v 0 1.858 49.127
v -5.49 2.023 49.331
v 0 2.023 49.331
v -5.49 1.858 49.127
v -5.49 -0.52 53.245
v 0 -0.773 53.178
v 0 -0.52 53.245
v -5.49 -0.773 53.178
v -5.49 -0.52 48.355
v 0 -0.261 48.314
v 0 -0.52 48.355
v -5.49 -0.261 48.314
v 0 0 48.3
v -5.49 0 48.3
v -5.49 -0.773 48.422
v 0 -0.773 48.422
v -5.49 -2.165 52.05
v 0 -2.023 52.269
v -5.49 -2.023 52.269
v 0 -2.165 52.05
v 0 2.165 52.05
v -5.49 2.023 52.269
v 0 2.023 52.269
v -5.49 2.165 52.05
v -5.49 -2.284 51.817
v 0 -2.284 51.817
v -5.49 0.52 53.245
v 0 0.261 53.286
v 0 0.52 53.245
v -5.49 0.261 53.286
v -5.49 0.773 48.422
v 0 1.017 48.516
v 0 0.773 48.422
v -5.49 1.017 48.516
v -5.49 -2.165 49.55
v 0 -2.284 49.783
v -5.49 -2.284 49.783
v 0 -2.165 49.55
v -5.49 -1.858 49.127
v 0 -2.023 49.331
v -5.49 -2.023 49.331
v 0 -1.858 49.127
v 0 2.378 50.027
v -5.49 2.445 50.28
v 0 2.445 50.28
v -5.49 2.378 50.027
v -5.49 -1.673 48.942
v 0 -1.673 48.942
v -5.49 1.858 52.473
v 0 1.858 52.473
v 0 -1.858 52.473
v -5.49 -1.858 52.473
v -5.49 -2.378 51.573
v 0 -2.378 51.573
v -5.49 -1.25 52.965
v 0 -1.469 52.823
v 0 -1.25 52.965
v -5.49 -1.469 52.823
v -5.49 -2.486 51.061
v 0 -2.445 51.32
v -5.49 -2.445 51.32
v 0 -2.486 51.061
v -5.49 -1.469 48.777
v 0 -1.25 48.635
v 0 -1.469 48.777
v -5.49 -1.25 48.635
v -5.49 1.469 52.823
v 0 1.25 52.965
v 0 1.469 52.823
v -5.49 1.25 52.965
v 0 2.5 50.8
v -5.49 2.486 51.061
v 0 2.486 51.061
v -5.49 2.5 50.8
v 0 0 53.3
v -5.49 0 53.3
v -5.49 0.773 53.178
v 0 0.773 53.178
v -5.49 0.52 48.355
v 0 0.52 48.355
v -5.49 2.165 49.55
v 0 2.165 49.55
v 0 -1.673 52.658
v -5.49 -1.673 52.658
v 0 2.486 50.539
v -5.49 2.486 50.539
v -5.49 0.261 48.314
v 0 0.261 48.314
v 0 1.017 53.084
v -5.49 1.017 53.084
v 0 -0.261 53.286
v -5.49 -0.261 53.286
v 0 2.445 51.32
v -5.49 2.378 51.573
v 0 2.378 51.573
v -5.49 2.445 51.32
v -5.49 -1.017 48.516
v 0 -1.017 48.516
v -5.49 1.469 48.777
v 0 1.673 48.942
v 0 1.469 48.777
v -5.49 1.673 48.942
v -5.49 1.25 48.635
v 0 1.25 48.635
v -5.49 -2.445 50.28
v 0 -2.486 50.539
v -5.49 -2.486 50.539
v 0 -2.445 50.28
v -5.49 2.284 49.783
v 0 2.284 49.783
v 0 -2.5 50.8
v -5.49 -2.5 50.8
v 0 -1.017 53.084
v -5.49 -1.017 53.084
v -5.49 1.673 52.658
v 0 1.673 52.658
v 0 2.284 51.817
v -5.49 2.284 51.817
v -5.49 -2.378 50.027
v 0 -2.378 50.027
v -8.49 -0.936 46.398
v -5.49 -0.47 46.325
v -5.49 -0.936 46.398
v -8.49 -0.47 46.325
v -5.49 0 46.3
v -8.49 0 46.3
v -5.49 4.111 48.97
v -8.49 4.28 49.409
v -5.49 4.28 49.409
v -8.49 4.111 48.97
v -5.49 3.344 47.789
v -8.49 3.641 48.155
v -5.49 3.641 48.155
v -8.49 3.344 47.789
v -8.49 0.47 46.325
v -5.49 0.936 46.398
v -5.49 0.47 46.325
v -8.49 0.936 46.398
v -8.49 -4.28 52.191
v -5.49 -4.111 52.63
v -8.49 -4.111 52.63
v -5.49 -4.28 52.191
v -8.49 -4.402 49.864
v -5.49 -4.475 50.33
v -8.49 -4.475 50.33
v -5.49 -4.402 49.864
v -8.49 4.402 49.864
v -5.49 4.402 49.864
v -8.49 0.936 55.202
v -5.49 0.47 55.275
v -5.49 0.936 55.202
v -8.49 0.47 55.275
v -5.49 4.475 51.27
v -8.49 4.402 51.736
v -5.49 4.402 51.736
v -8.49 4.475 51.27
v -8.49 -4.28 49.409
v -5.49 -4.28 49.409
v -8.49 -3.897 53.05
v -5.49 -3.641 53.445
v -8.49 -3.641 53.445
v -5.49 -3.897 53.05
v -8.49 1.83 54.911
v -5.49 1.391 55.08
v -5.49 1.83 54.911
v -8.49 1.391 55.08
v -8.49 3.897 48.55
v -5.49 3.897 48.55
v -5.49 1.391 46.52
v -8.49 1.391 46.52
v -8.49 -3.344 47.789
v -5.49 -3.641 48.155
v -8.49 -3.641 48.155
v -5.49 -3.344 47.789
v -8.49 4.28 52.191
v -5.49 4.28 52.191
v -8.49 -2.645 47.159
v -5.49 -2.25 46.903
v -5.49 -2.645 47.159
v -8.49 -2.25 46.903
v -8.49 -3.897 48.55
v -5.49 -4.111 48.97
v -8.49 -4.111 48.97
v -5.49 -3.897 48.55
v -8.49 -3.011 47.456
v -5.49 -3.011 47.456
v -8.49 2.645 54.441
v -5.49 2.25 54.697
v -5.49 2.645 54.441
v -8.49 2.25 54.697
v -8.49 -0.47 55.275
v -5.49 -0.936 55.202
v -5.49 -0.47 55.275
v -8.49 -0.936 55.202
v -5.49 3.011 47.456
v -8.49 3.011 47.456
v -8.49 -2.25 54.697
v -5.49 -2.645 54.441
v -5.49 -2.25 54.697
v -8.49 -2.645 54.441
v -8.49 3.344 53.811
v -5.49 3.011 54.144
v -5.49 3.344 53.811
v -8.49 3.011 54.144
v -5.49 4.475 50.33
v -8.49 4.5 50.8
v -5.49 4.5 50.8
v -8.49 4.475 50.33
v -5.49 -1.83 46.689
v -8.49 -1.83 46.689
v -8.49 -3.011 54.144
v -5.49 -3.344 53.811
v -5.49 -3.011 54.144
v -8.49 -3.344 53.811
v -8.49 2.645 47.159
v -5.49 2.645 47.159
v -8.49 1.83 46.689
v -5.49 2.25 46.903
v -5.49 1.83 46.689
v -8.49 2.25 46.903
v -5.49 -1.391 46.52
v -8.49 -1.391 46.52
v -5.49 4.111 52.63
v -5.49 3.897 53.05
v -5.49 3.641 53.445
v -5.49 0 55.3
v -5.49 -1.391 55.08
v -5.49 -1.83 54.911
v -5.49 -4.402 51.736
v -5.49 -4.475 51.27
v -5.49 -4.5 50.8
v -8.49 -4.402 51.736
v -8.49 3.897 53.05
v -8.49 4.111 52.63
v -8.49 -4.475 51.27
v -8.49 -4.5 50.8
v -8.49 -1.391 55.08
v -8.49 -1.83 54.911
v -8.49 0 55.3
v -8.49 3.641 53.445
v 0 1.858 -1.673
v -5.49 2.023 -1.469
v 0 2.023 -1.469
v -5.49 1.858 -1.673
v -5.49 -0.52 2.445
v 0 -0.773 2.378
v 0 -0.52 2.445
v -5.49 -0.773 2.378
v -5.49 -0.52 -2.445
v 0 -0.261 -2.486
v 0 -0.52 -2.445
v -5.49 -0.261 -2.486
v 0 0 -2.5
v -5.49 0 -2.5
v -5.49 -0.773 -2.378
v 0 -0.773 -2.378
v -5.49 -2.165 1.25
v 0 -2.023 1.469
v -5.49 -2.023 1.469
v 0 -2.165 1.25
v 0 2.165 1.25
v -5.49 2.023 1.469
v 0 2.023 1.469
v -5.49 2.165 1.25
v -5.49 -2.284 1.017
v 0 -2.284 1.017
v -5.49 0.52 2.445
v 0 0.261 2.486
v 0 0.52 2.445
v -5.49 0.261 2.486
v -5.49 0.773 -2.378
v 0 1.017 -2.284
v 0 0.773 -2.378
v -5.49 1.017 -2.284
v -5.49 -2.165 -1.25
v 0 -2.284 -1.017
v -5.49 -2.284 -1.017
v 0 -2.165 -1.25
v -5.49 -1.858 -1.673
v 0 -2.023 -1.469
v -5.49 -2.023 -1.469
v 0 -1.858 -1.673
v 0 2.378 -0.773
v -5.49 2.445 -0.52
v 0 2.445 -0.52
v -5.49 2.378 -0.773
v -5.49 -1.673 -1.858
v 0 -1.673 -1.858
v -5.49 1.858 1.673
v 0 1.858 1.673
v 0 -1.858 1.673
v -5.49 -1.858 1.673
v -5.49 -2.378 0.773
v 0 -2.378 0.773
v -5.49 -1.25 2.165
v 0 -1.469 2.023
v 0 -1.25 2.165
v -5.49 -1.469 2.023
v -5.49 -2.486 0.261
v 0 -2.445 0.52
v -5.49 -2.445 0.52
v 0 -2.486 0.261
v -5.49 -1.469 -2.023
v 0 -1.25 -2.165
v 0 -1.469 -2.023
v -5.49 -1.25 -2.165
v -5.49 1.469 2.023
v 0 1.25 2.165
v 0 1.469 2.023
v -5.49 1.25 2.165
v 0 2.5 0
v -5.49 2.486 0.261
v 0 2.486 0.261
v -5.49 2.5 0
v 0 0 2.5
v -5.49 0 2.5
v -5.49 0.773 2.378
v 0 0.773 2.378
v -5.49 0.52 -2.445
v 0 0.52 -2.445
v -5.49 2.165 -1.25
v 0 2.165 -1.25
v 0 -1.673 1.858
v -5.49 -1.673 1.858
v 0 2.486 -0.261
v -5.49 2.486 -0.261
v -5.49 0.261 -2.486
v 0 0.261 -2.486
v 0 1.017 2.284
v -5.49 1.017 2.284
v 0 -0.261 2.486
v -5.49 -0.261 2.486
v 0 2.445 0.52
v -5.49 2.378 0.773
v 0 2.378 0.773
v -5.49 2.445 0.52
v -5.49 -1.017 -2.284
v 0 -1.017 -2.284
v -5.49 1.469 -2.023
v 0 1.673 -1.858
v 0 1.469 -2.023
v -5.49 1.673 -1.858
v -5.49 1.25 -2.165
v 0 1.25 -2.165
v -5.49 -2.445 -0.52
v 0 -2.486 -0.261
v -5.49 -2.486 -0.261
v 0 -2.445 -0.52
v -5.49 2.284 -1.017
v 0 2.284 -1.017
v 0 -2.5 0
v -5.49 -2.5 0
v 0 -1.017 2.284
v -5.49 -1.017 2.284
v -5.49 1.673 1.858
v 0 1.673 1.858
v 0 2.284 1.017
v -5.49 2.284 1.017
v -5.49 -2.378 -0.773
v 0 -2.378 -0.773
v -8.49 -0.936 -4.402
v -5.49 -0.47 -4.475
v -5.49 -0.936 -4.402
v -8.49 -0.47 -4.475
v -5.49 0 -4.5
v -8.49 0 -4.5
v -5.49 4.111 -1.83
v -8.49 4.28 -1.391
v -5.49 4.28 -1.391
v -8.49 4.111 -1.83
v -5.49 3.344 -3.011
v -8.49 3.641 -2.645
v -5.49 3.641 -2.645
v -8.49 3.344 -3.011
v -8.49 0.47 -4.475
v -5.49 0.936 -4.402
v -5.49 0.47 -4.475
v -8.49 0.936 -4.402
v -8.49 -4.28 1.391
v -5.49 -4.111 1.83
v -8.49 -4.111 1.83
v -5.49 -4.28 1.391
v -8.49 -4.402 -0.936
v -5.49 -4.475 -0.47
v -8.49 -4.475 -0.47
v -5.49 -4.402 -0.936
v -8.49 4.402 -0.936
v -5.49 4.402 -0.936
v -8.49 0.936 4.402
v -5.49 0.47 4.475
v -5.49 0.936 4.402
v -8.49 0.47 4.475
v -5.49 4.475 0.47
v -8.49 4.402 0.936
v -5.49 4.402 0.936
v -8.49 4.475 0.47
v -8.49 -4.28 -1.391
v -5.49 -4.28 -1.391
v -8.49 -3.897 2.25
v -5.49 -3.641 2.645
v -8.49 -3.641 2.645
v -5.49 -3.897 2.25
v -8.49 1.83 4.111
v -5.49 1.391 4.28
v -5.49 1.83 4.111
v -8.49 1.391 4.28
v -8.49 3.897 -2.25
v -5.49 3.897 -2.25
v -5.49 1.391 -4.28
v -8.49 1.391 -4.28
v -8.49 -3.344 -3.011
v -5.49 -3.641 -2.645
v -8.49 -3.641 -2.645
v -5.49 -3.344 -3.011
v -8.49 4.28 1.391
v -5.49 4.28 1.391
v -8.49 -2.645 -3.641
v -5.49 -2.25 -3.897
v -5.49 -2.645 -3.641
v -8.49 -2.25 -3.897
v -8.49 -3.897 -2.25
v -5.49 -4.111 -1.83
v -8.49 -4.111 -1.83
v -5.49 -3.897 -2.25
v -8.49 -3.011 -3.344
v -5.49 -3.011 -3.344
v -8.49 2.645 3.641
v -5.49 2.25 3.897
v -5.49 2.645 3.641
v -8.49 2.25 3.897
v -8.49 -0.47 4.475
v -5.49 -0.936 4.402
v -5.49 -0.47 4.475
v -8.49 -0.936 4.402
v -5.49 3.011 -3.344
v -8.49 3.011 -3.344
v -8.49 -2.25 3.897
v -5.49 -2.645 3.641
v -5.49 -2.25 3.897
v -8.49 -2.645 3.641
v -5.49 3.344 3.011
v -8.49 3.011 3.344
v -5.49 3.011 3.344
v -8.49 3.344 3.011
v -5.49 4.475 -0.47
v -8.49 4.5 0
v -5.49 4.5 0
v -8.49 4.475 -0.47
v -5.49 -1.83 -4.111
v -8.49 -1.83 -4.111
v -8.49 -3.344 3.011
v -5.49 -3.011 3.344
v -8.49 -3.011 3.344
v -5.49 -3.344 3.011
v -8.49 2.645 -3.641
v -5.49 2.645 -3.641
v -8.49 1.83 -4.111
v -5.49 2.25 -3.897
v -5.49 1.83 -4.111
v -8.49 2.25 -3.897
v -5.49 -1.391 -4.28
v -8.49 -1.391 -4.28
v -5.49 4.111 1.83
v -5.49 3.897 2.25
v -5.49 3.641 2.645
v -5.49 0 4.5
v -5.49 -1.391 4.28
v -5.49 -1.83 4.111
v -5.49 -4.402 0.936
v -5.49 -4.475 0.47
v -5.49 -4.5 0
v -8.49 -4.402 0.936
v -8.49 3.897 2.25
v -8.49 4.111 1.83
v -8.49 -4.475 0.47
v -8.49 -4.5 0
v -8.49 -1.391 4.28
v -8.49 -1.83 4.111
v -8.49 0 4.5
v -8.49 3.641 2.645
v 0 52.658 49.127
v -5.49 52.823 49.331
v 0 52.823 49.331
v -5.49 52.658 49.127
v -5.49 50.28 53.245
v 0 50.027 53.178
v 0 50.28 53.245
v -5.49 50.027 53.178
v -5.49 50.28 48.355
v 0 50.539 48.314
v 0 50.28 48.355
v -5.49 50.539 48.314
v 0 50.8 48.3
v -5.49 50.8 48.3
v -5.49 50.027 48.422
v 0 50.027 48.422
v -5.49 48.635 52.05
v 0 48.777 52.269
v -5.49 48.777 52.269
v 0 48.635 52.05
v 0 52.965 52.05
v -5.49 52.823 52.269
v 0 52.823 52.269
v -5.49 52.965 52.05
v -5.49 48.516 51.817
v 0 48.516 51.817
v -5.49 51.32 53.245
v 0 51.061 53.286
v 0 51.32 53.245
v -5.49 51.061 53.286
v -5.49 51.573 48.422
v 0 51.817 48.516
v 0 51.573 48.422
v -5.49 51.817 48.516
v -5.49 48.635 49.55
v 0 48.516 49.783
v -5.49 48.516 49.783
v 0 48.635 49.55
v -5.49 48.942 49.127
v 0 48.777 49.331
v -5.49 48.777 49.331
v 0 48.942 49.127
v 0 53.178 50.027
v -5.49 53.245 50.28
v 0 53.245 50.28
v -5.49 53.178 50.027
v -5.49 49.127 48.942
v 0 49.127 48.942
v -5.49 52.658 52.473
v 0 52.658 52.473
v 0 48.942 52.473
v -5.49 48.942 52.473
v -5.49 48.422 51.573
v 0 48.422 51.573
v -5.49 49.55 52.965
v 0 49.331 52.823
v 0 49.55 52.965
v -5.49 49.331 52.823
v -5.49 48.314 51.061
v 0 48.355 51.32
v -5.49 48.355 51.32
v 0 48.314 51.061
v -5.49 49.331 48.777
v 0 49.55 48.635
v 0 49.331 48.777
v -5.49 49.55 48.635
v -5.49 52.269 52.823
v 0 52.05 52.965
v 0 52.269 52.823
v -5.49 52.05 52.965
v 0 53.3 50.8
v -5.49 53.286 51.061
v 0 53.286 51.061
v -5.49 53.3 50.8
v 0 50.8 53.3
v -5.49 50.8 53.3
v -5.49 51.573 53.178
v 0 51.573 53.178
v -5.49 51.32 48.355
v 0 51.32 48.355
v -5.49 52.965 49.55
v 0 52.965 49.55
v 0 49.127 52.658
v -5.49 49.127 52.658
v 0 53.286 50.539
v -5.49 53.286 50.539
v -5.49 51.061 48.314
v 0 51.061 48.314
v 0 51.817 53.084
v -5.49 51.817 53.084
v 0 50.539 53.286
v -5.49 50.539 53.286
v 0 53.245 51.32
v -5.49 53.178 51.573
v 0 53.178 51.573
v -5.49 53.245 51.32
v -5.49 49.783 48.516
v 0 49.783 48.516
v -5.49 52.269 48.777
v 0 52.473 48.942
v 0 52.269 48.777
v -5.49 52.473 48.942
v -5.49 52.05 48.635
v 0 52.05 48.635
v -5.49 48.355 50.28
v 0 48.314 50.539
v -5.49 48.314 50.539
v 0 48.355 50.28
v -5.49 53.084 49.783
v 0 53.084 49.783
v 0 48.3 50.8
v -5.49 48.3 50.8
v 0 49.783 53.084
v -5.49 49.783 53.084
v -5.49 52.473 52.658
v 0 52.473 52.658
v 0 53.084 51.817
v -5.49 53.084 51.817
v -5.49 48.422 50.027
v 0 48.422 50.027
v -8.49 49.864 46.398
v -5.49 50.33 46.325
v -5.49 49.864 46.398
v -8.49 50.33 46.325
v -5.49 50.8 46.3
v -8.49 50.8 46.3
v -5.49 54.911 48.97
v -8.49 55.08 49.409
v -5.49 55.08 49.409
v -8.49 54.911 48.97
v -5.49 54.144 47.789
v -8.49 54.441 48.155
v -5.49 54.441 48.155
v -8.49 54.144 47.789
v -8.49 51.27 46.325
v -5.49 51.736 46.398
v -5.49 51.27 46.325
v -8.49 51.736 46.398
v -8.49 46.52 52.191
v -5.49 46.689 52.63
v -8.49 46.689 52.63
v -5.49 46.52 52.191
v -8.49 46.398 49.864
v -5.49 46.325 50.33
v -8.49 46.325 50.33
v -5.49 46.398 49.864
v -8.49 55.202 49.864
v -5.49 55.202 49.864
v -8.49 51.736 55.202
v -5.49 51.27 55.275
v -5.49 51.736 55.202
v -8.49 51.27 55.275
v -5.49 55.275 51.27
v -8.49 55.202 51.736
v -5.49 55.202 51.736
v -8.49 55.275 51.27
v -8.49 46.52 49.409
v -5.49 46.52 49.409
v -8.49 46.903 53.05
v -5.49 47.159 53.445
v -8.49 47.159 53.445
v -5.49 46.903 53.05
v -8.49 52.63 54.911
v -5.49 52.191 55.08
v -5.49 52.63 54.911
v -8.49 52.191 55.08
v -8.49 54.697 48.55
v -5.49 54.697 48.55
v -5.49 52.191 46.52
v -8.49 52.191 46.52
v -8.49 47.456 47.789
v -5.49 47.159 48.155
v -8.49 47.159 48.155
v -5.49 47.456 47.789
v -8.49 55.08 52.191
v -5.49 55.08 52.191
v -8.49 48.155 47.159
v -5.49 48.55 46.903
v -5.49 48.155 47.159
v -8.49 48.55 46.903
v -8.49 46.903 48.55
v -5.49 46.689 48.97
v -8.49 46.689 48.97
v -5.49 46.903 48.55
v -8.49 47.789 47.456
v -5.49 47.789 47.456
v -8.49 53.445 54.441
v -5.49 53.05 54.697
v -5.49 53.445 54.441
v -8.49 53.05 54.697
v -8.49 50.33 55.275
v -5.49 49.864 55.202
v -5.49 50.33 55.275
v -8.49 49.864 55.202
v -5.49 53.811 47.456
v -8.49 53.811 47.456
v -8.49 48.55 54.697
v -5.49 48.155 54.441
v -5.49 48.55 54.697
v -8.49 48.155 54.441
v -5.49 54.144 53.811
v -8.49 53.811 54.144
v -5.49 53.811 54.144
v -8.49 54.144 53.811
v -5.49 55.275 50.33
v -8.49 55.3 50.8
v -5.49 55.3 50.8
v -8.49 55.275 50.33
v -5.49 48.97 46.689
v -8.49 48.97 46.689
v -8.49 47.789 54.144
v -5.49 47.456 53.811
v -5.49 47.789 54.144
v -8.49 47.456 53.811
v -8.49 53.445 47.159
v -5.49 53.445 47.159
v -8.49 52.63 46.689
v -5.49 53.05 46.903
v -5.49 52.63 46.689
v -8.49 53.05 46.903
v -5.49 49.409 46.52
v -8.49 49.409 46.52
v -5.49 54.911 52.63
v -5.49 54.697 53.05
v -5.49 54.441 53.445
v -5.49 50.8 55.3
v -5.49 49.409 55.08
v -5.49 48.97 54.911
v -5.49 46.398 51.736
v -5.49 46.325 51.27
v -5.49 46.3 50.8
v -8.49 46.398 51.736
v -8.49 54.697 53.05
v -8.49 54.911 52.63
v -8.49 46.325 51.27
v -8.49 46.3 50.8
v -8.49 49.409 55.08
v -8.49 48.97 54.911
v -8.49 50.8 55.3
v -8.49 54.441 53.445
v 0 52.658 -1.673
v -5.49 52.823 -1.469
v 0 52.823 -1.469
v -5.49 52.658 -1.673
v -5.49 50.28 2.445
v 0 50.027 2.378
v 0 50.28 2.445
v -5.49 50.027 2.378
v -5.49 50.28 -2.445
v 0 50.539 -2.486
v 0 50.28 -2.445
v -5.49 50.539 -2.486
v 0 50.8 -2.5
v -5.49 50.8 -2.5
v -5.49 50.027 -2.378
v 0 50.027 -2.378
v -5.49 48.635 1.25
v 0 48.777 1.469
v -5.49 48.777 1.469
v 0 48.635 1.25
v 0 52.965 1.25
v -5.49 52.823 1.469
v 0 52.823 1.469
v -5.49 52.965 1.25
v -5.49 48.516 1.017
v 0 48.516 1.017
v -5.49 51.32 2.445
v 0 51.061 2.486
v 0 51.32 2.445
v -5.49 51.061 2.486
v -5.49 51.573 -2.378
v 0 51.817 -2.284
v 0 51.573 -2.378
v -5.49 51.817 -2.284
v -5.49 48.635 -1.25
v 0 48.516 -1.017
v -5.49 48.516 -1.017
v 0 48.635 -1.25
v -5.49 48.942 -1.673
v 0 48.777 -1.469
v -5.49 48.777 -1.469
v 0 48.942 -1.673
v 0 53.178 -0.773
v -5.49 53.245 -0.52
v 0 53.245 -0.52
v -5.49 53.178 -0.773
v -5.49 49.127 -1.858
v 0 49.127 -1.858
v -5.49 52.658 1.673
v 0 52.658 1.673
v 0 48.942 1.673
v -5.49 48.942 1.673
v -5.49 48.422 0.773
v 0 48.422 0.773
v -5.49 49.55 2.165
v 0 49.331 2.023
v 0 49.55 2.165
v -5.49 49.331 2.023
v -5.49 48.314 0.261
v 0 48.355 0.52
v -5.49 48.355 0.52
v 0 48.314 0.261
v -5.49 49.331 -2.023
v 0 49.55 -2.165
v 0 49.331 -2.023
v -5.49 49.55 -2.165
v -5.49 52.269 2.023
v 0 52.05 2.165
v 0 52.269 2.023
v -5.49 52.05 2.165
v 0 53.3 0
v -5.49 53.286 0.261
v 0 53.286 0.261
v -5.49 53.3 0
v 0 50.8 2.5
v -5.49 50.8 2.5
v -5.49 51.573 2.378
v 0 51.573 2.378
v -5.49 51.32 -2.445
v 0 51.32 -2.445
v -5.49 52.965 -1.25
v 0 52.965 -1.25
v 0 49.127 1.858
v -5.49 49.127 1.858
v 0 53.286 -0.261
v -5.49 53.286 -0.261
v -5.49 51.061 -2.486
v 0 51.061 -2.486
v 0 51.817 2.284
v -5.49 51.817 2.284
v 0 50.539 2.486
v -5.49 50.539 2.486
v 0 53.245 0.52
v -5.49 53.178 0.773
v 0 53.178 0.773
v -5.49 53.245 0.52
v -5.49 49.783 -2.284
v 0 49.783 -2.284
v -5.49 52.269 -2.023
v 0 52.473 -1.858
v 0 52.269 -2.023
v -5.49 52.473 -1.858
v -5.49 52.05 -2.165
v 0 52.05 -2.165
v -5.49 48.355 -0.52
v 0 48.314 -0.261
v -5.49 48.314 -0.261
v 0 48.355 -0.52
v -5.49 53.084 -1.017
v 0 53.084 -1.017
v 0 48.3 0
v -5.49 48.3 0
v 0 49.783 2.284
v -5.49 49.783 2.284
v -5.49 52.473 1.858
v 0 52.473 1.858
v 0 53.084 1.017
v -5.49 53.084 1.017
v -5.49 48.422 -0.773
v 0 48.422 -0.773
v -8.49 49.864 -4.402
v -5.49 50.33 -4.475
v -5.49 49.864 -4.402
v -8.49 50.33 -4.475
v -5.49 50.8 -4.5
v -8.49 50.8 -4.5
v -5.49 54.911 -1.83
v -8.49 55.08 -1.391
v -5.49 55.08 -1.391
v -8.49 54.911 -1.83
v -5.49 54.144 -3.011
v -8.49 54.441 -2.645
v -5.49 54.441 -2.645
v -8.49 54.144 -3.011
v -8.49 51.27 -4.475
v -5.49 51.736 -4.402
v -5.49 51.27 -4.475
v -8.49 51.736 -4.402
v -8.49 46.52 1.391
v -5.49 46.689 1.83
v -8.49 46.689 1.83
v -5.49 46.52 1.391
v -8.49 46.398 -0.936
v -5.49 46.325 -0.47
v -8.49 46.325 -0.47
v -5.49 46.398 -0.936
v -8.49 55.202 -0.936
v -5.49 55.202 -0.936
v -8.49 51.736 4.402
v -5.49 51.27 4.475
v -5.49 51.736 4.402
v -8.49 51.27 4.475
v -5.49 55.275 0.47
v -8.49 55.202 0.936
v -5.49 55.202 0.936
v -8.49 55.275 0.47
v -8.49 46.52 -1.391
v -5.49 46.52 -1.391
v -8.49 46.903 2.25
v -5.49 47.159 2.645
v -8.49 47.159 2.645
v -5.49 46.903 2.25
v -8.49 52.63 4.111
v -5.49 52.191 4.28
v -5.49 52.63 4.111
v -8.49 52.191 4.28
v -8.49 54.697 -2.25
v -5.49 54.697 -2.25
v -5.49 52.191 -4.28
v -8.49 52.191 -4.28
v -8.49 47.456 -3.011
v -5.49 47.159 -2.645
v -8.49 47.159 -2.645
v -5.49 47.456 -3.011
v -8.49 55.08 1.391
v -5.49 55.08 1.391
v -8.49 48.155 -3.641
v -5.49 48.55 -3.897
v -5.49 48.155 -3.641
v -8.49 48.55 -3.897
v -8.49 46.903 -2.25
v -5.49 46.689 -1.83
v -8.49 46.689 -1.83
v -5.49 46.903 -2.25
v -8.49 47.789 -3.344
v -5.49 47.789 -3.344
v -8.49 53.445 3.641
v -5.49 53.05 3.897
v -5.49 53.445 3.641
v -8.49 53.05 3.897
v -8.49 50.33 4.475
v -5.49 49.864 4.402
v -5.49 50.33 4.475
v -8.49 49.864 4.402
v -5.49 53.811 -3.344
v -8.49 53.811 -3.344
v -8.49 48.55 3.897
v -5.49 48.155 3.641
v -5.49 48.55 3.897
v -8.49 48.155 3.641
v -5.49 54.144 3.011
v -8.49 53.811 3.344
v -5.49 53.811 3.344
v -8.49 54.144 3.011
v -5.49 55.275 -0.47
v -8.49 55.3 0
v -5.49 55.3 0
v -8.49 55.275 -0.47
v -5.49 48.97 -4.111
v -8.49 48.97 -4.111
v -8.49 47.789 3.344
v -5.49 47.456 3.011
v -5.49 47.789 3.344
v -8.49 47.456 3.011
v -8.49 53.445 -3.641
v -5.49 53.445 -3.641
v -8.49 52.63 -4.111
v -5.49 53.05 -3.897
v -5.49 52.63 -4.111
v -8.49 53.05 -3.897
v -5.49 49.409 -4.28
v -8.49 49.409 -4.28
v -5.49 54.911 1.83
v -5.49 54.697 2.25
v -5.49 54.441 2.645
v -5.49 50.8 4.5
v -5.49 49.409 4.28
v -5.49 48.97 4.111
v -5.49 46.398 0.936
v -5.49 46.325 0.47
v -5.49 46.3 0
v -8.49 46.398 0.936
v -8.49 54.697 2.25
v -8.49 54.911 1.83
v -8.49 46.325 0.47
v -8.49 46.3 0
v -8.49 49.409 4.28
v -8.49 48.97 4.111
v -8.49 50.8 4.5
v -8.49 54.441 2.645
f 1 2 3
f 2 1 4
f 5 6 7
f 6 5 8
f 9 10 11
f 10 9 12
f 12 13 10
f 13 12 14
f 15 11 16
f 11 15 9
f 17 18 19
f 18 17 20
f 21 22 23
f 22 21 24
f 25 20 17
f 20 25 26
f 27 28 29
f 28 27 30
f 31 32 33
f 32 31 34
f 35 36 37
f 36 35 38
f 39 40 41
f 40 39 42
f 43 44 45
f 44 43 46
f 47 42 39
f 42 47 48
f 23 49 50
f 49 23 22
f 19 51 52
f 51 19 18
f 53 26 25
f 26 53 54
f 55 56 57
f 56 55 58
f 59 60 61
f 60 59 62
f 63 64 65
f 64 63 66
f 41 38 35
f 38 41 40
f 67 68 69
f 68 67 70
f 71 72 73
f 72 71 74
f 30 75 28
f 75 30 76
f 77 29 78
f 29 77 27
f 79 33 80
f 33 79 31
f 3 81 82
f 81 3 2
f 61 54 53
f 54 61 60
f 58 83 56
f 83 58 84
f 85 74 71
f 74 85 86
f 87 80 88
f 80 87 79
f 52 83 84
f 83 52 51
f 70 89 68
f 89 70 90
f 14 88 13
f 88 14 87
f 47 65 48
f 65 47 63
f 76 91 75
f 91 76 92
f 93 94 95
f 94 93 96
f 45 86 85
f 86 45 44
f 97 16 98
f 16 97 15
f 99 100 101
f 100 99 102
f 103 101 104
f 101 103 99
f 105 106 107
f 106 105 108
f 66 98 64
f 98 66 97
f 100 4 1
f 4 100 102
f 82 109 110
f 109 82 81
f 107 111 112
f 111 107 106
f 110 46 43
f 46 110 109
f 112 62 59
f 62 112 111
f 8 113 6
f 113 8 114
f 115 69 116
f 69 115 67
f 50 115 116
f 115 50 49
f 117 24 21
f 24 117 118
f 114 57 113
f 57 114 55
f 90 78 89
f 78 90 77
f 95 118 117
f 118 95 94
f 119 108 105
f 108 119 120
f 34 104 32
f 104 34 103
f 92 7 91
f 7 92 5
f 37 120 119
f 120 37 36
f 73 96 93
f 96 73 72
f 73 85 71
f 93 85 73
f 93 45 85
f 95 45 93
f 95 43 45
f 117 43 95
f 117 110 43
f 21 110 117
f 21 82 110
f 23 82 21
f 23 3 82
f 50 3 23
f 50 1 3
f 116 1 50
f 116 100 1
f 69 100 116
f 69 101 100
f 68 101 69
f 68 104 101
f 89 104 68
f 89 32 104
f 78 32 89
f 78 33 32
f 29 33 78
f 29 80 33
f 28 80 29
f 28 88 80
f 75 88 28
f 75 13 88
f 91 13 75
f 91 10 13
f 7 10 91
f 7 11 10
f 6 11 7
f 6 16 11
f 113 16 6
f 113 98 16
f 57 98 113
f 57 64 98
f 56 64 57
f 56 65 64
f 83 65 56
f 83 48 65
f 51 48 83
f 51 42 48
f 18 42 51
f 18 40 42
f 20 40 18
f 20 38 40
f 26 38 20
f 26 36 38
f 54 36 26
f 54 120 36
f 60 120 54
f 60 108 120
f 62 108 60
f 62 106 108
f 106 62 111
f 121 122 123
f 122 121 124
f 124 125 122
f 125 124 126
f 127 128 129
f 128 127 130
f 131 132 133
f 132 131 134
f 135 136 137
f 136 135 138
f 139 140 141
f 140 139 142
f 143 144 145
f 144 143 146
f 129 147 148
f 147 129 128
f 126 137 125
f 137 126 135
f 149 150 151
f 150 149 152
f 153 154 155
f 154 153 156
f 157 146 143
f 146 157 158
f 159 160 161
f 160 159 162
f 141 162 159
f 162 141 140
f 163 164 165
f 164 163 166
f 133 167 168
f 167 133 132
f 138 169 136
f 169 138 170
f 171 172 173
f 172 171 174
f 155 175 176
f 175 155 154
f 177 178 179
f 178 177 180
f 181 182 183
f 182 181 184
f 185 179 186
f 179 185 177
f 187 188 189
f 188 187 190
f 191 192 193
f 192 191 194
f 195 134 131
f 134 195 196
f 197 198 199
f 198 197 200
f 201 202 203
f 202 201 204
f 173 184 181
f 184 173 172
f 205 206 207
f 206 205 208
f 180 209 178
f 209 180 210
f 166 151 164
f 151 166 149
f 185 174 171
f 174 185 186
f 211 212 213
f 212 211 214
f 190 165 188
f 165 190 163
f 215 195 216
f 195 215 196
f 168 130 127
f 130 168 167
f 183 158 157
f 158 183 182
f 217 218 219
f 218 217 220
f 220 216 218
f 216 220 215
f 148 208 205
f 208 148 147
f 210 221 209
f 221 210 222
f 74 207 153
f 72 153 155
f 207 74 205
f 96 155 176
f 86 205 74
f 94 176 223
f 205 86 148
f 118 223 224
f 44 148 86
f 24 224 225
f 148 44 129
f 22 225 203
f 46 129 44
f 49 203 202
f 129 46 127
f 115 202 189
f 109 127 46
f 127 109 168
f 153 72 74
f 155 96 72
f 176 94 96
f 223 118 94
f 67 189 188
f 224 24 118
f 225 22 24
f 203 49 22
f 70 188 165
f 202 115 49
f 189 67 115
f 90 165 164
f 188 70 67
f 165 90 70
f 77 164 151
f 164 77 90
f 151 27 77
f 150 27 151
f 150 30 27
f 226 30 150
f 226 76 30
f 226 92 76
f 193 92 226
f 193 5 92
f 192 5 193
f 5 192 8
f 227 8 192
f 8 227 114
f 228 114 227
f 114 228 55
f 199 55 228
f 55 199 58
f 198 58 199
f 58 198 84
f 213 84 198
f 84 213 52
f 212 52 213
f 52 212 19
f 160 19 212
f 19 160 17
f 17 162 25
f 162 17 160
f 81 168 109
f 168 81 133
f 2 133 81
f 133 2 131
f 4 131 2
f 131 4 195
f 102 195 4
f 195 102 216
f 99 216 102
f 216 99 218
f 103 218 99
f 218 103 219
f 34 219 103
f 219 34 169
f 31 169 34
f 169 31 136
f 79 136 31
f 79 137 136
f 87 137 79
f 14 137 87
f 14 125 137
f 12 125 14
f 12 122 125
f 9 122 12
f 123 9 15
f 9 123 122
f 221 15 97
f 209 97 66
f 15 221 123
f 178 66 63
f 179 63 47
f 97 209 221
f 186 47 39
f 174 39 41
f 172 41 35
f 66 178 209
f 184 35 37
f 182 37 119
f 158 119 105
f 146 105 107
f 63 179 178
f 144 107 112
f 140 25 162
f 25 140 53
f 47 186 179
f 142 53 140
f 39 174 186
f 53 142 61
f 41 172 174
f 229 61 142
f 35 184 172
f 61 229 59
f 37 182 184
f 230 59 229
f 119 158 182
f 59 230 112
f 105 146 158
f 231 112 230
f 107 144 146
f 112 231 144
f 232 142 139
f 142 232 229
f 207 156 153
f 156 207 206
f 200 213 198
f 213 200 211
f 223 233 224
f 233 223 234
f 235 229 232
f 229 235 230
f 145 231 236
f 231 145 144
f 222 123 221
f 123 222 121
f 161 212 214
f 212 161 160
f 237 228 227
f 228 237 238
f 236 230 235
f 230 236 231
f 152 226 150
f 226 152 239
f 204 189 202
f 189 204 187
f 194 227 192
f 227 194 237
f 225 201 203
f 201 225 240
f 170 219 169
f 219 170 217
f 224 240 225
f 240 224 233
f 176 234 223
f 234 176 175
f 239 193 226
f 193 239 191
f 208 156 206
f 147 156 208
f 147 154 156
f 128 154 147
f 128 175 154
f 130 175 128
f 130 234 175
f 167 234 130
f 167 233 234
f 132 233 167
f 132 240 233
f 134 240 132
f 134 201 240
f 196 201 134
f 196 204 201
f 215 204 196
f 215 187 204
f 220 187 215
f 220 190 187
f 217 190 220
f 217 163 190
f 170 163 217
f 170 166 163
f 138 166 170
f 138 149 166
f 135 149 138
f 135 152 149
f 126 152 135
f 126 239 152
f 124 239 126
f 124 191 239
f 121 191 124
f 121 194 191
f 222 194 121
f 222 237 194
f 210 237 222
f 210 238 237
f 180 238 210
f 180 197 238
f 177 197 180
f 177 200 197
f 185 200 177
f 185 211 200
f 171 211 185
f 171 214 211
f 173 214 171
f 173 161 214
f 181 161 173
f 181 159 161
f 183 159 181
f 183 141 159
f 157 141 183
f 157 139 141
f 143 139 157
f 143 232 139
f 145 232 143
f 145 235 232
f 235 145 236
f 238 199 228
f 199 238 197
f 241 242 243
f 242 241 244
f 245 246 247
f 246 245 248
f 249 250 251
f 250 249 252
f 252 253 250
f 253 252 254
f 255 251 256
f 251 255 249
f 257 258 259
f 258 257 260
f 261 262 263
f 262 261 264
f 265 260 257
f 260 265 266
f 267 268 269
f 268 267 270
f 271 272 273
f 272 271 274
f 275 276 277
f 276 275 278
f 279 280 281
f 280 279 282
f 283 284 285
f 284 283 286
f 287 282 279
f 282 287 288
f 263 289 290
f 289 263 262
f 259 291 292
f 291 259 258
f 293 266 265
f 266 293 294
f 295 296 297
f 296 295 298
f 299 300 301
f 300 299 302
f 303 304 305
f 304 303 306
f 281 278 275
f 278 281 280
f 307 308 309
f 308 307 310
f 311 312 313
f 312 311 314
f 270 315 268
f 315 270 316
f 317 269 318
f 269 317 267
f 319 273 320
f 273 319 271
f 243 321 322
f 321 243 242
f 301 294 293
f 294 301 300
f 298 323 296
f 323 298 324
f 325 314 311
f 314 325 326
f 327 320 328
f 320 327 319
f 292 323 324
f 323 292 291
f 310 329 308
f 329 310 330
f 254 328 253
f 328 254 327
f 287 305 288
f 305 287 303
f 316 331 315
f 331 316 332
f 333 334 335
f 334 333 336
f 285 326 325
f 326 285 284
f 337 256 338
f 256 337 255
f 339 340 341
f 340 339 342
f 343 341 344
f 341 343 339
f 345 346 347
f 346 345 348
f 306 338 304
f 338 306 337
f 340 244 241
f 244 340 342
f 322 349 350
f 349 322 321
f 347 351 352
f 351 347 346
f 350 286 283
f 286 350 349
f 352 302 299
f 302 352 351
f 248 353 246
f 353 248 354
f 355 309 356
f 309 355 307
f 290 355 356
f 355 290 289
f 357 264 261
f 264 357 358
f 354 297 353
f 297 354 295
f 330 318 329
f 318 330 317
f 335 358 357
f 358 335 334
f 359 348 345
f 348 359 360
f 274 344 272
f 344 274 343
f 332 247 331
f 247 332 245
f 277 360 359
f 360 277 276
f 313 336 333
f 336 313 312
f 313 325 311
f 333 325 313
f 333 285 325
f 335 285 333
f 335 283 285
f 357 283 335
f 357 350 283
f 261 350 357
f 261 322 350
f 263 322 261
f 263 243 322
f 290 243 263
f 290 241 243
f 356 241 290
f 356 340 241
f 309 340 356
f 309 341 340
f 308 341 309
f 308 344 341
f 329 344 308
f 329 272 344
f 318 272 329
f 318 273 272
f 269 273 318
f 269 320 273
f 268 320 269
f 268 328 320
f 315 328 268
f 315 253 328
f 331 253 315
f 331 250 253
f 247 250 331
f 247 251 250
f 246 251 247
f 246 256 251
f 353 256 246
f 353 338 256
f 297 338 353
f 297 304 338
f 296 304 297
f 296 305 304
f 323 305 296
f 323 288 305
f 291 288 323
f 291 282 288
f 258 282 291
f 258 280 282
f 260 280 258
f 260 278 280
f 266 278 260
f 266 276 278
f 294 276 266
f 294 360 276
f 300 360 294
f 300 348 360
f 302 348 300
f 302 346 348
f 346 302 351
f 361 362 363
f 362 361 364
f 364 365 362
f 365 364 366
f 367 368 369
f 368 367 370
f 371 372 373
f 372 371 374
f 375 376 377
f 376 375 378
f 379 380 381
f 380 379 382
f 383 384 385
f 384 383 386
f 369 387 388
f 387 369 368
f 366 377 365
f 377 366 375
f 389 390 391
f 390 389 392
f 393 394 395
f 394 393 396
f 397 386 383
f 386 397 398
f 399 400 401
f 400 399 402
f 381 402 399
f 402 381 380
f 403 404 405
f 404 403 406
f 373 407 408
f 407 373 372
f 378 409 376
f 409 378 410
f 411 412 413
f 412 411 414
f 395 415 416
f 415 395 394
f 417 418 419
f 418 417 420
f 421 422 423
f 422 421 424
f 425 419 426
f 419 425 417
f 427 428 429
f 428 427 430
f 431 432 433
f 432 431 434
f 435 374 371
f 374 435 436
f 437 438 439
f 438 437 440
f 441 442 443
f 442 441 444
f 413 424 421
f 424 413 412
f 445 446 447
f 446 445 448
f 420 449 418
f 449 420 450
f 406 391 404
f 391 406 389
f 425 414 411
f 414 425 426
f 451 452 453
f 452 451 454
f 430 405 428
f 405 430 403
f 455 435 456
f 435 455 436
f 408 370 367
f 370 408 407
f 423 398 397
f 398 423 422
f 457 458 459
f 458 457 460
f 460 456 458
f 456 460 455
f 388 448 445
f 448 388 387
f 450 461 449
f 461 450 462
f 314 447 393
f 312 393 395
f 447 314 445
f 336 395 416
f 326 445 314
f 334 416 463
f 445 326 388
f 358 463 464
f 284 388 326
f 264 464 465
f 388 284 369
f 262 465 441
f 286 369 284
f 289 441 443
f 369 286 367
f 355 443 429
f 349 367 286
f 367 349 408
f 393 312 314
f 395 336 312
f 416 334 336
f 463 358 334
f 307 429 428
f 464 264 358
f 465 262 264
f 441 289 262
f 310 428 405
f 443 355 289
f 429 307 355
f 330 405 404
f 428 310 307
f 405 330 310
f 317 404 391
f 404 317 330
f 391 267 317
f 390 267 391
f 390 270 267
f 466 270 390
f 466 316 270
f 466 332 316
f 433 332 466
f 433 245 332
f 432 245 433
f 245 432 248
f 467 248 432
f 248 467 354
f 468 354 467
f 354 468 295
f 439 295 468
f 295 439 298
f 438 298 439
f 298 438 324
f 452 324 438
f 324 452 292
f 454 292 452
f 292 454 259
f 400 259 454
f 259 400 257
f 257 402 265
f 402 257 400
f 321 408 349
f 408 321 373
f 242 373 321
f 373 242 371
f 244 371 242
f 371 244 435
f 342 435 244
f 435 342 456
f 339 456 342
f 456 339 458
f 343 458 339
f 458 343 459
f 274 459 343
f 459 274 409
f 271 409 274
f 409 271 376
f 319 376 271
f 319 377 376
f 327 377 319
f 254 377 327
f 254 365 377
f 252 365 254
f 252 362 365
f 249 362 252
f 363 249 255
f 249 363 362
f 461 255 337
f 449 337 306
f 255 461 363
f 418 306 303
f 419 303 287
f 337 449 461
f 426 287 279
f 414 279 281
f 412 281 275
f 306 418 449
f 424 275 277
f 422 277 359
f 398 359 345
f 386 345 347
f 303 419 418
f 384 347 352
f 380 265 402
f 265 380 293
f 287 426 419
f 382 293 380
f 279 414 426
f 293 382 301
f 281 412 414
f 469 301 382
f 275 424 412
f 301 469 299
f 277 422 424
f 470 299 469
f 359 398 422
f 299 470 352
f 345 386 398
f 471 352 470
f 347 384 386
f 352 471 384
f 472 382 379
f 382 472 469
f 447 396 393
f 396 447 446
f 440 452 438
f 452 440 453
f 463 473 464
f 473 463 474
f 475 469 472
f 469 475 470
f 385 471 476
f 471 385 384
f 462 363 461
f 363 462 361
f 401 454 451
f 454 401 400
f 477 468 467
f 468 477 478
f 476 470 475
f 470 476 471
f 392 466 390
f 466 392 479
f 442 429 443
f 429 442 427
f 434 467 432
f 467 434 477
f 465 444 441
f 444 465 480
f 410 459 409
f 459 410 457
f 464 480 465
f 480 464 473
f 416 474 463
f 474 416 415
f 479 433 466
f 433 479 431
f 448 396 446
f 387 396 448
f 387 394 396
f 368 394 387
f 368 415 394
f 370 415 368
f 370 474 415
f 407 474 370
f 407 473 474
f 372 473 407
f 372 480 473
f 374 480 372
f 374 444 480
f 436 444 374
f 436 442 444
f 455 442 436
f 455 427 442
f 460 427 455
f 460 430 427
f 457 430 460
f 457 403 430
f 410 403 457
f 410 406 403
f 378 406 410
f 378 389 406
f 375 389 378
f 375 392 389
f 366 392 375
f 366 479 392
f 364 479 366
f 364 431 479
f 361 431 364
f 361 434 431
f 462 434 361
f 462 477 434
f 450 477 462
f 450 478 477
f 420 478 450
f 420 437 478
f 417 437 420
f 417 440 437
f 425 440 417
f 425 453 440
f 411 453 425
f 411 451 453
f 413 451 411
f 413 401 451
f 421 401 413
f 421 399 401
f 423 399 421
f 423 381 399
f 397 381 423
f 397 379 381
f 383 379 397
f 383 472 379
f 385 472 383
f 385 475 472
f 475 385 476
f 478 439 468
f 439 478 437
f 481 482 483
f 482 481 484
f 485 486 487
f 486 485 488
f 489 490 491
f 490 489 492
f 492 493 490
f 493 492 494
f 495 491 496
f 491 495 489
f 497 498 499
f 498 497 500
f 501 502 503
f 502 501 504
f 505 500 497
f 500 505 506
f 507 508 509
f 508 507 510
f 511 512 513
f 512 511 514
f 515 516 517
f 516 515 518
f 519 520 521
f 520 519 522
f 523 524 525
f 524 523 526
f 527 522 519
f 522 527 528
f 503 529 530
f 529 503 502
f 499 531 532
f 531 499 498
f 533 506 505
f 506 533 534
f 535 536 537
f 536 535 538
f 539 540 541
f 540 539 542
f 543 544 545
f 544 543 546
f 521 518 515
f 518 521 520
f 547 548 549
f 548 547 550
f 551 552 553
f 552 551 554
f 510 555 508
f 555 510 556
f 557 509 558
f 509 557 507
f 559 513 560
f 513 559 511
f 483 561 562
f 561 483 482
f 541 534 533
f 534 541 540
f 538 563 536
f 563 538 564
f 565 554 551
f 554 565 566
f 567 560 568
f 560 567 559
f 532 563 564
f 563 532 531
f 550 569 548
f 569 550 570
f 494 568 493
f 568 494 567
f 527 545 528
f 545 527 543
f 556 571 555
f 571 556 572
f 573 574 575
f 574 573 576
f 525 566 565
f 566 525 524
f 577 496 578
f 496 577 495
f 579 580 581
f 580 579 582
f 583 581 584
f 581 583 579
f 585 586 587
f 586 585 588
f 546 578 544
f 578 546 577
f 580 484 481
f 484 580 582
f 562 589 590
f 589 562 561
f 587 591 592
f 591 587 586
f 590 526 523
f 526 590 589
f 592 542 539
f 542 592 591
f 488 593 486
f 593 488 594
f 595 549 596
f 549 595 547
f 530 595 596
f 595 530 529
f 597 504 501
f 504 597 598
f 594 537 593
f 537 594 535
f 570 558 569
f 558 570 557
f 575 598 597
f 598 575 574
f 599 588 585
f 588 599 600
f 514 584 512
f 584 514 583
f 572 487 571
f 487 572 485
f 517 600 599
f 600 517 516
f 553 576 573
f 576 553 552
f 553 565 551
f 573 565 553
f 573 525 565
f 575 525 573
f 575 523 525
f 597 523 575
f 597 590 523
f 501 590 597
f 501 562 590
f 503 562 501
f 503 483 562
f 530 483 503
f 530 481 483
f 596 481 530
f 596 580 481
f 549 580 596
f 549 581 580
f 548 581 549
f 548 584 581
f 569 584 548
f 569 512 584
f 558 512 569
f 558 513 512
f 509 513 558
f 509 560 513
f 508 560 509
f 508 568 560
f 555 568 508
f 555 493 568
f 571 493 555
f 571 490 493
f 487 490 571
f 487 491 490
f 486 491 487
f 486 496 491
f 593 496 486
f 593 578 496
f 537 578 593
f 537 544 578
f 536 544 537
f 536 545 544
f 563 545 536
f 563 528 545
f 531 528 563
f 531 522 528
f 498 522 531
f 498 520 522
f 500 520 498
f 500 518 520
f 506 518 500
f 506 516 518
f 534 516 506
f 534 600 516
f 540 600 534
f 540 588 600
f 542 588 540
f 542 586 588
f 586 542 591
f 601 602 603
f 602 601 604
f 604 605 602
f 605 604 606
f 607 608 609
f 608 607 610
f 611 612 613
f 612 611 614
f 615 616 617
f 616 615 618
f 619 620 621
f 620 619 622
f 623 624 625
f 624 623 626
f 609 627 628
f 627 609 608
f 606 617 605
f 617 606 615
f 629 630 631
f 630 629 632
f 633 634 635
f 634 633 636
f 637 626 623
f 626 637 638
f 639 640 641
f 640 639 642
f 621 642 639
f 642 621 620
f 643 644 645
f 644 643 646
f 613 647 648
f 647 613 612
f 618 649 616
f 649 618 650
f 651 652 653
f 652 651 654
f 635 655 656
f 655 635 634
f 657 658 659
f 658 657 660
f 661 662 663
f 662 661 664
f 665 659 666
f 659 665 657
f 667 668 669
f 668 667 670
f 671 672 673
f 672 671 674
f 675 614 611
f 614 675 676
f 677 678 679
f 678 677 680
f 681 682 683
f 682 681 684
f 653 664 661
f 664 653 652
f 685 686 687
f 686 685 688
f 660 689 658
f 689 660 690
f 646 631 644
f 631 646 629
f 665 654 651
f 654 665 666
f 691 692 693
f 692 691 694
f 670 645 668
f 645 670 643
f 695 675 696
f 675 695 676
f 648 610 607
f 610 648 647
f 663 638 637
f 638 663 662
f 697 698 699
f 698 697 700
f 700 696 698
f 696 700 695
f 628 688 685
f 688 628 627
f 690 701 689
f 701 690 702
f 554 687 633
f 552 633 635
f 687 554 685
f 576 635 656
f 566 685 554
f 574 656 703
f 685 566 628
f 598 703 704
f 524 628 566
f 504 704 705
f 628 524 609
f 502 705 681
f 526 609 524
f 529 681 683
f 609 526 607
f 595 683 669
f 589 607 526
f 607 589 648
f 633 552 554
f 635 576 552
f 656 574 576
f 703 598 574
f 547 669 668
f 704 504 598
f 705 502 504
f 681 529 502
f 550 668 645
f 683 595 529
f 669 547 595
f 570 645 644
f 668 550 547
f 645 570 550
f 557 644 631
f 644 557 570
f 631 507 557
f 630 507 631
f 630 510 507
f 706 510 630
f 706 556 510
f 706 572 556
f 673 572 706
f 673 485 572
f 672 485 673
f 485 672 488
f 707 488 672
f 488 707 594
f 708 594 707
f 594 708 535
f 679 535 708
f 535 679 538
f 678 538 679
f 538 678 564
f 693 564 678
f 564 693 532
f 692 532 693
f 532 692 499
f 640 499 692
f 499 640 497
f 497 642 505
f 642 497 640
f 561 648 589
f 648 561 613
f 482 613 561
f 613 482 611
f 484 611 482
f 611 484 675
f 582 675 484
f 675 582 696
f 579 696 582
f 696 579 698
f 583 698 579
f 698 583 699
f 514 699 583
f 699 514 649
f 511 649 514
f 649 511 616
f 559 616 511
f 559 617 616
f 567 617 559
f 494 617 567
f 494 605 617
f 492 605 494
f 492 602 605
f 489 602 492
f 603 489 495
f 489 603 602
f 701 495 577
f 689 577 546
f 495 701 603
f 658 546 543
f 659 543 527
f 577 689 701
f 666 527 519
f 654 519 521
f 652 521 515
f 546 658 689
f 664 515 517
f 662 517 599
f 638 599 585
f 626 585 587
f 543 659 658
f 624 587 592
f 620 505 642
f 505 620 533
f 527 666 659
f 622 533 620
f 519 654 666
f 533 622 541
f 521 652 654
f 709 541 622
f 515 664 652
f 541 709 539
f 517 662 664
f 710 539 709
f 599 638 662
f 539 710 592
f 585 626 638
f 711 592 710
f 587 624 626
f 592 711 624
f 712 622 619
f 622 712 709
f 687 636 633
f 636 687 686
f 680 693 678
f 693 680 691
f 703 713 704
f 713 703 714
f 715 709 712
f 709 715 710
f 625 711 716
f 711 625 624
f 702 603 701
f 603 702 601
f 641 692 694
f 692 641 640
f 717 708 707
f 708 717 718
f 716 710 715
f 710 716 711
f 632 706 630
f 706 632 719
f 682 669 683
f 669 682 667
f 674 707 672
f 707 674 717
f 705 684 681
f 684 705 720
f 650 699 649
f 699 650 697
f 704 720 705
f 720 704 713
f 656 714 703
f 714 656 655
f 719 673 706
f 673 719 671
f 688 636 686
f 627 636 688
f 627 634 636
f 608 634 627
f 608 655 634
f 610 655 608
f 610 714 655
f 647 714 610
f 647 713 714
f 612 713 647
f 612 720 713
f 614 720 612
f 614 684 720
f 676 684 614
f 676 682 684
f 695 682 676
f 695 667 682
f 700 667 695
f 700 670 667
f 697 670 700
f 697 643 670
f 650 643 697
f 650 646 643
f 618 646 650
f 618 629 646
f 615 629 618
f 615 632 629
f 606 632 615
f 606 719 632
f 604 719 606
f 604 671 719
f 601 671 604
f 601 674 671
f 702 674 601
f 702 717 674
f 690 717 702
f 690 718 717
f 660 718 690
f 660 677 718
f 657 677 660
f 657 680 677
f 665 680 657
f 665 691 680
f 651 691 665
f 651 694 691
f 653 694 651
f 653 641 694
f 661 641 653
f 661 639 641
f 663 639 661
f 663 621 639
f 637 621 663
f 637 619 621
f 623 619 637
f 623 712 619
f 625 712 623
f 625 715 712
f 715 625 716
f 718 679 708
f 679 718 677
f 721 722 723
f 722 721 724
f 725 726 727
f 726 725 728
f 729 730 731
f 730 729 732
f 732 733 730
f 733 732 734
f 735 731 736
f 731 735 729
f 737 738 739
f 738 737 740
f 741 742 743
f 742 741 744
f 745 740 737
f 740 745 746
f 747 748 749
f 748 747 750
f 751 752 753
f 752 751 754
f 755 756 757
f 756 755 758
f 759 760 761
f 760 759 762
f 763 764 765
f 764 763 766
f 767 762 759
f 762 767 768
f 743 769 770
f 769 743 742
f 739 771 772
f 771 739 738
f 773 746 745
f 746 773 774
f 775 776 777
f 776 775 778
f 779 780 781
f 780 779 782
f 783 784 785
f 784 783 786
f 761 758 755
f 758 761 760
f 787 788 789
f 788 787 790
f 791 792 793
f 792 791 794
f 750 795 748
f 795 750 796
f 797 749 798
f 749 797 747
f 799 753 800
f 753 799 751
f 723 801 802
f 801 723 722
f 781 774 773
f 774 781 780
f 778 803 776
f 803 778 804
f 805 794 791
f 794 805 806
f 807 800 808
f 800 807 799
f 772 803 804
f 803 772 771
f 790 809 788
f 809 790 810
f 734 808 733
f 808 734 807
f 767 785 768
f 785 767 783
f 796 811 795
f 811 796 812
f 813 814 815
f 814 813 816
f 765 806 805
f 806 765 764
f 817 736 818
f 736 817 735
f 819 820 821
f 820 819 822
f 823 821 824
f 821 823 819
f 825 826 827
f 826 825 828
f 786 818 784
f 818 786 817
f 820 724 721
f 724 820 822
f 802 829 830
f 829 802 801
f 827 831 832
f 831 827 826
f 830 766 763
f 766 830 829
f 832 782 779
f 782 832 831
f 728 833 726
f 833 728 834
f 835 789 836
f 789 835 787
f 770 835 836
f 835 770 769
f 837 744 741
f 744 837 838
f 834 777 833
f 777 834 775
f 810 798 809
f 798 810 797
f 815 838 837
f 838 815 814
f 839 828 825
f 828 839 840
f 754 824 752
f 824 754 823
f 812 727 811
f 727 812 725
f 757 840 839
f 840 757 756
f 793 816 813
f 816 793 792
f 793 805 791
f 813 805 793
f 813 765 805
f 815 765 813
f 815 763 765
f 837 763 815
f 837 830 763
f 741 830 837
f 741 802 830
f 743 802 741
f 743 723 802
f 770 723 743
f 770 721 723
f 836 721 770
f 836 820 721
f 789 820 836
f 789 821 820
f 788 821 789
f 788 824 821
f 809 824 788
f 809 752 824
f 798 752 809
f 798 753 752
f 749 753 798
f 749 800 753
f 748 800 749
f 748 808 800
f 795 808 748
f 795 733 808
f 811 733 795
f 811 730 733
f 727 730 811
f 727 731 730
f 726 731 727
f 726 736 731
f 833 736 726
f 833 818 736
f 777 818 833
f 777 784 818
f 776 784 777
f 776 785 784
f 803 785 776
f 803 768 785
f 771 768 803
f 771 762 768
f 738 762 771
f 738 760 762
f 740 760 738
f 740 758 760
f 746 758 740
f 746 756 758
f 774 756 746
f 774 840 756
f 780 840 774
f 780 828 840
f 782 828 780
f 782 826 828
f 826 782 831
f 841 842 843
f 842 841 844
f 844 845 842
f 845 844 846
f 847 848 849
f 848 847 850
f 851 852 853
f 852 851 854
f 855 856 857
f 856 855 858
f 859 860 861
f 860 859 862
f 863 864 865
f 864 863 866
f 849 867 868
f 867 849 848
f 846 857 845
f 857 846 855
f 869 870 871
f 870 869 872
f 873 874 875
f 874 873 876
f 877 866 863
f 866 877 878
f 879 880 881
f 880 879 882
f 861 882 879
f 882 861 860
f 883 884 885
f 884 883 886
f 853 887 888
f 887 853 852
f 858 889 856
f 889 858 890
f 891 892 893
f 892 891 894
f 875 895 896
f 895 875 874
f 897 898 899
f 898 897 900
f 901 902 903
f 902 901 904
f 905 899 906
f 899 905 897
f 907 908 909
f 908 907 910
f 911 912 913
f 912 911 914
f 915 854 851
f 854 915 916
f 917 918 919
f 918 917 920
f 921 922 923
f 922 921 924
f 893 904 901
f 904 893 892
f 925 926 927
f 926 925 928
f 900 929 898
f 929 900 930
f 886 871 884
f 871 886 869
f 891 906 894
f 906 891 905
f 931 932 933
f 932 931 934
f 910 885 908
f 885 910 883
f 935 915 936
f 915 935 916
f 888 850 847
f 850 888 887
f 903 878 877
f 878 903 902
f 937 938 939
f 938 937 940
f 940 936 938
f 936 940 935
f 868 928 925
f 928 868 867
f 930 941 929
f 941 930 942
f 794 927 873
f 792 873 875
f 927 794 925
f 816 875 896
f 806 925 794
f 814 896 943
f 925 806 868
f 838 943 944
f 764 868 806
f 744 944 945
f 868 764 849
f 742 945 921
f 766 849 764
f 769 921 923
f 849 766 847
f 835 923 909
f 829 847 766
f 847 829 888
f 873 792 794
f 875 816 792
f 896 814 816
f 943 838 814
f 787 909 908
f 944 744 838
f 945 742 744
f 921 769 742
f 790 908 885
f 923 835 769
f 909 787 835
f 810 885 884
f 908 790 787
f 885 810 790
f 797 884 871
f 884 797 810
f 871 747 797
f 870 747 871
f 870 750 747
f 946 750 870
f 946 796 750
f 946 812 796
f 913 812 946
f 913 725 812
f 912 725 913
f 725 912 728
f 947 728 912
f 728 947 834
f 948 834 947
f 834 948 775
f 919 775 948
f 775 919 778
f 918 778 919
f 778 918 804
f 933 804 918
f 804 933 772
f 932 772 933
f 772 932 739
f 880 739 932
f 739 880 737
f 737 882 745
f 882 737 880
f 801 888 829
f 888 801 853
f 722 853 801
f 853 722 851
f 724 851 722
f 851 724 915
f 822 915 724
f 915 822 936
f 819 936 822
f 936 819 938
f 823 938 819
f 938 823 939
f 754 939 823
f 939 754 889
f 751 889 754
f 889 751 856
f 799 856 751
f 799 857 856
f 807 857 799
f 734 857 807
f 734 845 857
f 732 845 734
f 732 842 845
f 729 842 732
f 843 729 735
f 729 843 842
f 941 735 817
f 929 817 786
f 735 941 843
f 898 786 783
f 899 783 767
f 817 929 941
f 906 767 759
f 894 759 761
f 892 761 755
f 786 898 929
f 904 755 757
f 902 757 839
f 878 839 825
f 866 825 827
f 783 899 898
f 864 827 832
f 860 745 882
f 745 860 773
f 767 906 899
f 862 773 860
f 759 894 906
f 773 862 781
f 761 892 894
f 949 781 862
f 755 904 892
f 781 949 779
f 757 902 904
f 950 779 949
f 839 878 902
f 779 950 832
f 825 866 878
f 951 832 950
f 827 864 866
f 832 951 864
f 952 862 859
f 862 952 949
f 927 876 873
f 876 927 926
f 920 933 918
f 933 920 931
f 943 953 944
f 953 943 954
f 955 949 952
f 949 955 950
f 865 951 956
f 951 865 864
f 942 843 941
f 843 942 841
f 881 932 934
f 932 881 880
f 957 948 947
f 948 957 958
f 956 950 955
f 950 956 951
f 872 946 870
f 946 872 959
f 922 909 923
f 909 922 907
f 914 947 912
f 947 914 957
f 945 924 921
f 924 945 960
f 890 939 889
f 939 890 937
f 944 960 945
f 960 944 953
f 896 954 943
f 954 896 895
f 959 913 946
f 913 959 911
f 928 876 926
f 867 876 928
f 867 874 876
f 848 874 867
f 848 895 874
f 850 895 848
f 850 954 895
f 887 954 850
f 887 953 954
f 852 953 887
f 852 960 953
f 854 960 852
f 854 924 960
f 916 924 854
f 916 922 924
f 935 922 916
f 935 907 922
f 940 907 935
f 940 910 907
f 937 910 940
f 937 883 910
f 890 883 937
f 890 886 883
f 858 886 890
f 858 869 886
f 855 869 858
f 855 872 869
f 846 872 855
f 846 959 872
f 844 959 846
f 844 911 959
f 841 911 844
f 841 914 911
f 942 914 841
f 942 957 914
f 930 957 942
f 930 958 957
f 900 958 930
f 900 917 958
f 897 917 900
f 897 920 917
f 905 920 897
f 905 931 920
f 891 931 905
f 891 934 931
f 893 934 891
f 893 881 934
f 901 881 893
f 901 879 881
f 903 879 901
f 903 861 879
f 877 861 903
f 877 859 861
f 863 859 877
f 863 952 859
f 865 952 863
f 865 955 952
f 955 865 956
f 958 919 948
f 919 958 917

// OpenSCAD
//pegType -- one of "hooked" or "straight", 
//pegBigDiameter, pegBigHeight, pegSmallDiameter, pegSmallheight only apply to the straight type peg
//pegOnly -- true if you only want the pegs and no plate, false if you want the pegs and the plate
module hookedPegs(numOfPegs = 2, pegDiameter = 5, pegDistance = 25.4, pegsToSpanY = 2, includeBottomPeg = true, pegsToSpanZ = 2) {
    echo("***** hookedPegs() *****");
    echo("NumOfPegs: ", numOfPegs);
    echo("IncludeBottomPeg: ", includeBottomPeg);
    echo("PegsToSpanY: ", pegsToSpanY);
    echo("PegsToSpanZ: ", pegsToSpanZ);

    pegSpacingY = pegDistance * pegsToSpanY;
    pegSpacingZ = pegDistance * pegsToSpanZ; 
    echo("PegSpacingY: ", pegSpacingY);
    echo("PegSpacingZ: ", pegSpacingZ);

    for (i = [0 : numOfPegs - 1]) {
        topZ = includeBottomPeg ? pegSpacingZ : 0;
        translate([0, (i * pegSpacingY), topZ]) topPeg();

        if (includeBottomPeg) {
            echo("includeBottomPeg in if");
            translate([0, (i * pegSpacingY), 0]) bottomPeg();
        }
    }

    module topPeg() {
        rotate([0, 0, 180]) pegboardHookedPeg(diameter = pegDiameter);
    }

    module bottomPeg() {
        echo("in bottomPeg(): ");
        rotate([0, 0, 180]) pegboardPeg(diameter = pegDiameter); 
    }
}

module straightPegs(pegDistance = 25.4, pegsToSpanY = 2, pegsToSpanZ = 2, includeBottomPeg = true, numOfPegs = 2, pegBigDiameter = 9, 
    pegBigHeight = 3, pegSmallDiameter = 5, pegSmallheight = 5.5) {

    echo("***** straightPegs() *****");
    echo("NumOfPegs: ", numOfPegs);
    echo("IncludeBottomPeg: ", includeBottomPeg);
    echo("PegsToSpanY: ", pegsToSpanY);
    echo("PegsToSpanZ: ", pegsToSpanZ);

    pegSpacingY = pegDistance * pegsToSpanY;
    pegSpacingZ = pegDistance * pegsToSpanZ; 
    echo("PegSpacingY: ", pegSpacingY);
    echo("PegSpacingZ: ", pegSpacingZ);

    for (i = [0 : numOfPegs - 1]) {
        topZ = includeBottomPeg ? pegSpacingZ : 0;
        translate([0, (i * pegSpacingY), topZ]) topPeg();

        if (includeBottomPeg) {
            echo("includeBottomPeg in if");
            translate([0, (i * pegSpacingY), 0]) bottomPeg();
        }
    }

    echo("PegSpacingY: ", pegSpacingY);
    echo("PegSpacingZ: ", pegSpacingZ);

    module topPeg() {
        rotate([0, 0, 180]) straightPeg(pegBigDiameter, pegBigHeight, pegSmallDiameter, pegSmallheight);
    }

    module bottomPeg() {
        rotate([0, 0, 180]) straightPeg(pegBigDiameter, pegBigHeight, pegSmallDiameter, pegSmallheight);
    }
}

//A pegboard peg that has a horizontal component and then a vertical component that is angled the provided
//amount from the vertical. Set the $fn variable to control the quality
// -- 3/16" hole diameter pegboard is 4.7 mm diameter in metric
// -- 1/4" hole diameter pegboard is 6.4 mm diameter in metric
// -- 9/32" hole diameter pegboard is 7.1 mm diameter in metric
module pegboardHookedPeg(diameter = 5.0, horizontalLength = 9, verticalLength = 8, hookAngle = 45) {
    //The horizontal component of the peg
    translate([0, 0, 0]) pegboardPeg(diameter, horizontalLength);

    //The vertical component of the peg
    translate([horizontalLength - diameter / 2, 0, 0]) rotate([0, -hookAngle, 0]) pegboardPeg(diameter, verticalLength);
}

//A straight pegboard peg to be used as the bottom peg when a hooked peg is used
// -- 3/16" hole diameter pegboard is 4.7 mm diameter in metric
// -- 1/4" hole diameter pegboard is 6.4 mm diameter in metric
// -- 9/32" hole diameter pegboard is 7.1 mm diameter in metric
module pegboardPeg(diameter = 5.0, length = 8) {
    rotate([0, 90, 0]) hull() {
        linear_extrude(1) circle(d = diameter);
        translate([0, 0, length - (diameter / 2)]) sphere(d = diameter);
    }
}

module straightPeg(pegBigDiameter = 9, pegBigHeight = 3, pegSmallDiameter = 5, pegSmallheight = 5.5) {
    x = pegSmallheight / 2;
    translate([x, 0, 0]) rotate([0, 90, 0]) union() {
        cylinder(d = pegSmallDiameter, h = pegSmallheight, center = true);
        z = pegSmallheight / 2 + pegBigHeight / 2 - 0.01;
        translate([0, 0, z]) cylinder(d = pegBigDiameter, h = pegBigHeight, center = true);
    }
} 


//Returns [length, height] from the first peg to the last peg, can be used to center the pegs in an area
function calculatePegAreaDimensions(numOfPegs, pegDistance, pegsToSpanY, pegsToSpanZ) = [
    (numOfPegs - 1) * pegDistance * pegsToSpanY,
    pegDistance * pegsToSpanZ
    ];

// ***** Test *****

$fn = 60;
//hookedPegs(pegDiameter = 5, pegDistance = 25.4, pegsToSpanY = 2, pegsToSpanZ = 2, includeBottomPeg = true, numOfPegs = 2);
straightPegs(pegDistance = 25.4, pegsToSpanY = 2, pegsToSpanZ = 2, includeBottomPeg = true, numOfPegs = 2, pegBigDiameter = 9, pegBigHeight = 3, pegSmallDiameter = 5, pegSmallheight = 5.5);
pegArea = calculatePegAreaDimensions(numOfPegs = 2, pegDistance = 25.4, pegsToSpanY = 2, pegsToSpanZ = 2);
echo("pegArea: ", pegArea);
